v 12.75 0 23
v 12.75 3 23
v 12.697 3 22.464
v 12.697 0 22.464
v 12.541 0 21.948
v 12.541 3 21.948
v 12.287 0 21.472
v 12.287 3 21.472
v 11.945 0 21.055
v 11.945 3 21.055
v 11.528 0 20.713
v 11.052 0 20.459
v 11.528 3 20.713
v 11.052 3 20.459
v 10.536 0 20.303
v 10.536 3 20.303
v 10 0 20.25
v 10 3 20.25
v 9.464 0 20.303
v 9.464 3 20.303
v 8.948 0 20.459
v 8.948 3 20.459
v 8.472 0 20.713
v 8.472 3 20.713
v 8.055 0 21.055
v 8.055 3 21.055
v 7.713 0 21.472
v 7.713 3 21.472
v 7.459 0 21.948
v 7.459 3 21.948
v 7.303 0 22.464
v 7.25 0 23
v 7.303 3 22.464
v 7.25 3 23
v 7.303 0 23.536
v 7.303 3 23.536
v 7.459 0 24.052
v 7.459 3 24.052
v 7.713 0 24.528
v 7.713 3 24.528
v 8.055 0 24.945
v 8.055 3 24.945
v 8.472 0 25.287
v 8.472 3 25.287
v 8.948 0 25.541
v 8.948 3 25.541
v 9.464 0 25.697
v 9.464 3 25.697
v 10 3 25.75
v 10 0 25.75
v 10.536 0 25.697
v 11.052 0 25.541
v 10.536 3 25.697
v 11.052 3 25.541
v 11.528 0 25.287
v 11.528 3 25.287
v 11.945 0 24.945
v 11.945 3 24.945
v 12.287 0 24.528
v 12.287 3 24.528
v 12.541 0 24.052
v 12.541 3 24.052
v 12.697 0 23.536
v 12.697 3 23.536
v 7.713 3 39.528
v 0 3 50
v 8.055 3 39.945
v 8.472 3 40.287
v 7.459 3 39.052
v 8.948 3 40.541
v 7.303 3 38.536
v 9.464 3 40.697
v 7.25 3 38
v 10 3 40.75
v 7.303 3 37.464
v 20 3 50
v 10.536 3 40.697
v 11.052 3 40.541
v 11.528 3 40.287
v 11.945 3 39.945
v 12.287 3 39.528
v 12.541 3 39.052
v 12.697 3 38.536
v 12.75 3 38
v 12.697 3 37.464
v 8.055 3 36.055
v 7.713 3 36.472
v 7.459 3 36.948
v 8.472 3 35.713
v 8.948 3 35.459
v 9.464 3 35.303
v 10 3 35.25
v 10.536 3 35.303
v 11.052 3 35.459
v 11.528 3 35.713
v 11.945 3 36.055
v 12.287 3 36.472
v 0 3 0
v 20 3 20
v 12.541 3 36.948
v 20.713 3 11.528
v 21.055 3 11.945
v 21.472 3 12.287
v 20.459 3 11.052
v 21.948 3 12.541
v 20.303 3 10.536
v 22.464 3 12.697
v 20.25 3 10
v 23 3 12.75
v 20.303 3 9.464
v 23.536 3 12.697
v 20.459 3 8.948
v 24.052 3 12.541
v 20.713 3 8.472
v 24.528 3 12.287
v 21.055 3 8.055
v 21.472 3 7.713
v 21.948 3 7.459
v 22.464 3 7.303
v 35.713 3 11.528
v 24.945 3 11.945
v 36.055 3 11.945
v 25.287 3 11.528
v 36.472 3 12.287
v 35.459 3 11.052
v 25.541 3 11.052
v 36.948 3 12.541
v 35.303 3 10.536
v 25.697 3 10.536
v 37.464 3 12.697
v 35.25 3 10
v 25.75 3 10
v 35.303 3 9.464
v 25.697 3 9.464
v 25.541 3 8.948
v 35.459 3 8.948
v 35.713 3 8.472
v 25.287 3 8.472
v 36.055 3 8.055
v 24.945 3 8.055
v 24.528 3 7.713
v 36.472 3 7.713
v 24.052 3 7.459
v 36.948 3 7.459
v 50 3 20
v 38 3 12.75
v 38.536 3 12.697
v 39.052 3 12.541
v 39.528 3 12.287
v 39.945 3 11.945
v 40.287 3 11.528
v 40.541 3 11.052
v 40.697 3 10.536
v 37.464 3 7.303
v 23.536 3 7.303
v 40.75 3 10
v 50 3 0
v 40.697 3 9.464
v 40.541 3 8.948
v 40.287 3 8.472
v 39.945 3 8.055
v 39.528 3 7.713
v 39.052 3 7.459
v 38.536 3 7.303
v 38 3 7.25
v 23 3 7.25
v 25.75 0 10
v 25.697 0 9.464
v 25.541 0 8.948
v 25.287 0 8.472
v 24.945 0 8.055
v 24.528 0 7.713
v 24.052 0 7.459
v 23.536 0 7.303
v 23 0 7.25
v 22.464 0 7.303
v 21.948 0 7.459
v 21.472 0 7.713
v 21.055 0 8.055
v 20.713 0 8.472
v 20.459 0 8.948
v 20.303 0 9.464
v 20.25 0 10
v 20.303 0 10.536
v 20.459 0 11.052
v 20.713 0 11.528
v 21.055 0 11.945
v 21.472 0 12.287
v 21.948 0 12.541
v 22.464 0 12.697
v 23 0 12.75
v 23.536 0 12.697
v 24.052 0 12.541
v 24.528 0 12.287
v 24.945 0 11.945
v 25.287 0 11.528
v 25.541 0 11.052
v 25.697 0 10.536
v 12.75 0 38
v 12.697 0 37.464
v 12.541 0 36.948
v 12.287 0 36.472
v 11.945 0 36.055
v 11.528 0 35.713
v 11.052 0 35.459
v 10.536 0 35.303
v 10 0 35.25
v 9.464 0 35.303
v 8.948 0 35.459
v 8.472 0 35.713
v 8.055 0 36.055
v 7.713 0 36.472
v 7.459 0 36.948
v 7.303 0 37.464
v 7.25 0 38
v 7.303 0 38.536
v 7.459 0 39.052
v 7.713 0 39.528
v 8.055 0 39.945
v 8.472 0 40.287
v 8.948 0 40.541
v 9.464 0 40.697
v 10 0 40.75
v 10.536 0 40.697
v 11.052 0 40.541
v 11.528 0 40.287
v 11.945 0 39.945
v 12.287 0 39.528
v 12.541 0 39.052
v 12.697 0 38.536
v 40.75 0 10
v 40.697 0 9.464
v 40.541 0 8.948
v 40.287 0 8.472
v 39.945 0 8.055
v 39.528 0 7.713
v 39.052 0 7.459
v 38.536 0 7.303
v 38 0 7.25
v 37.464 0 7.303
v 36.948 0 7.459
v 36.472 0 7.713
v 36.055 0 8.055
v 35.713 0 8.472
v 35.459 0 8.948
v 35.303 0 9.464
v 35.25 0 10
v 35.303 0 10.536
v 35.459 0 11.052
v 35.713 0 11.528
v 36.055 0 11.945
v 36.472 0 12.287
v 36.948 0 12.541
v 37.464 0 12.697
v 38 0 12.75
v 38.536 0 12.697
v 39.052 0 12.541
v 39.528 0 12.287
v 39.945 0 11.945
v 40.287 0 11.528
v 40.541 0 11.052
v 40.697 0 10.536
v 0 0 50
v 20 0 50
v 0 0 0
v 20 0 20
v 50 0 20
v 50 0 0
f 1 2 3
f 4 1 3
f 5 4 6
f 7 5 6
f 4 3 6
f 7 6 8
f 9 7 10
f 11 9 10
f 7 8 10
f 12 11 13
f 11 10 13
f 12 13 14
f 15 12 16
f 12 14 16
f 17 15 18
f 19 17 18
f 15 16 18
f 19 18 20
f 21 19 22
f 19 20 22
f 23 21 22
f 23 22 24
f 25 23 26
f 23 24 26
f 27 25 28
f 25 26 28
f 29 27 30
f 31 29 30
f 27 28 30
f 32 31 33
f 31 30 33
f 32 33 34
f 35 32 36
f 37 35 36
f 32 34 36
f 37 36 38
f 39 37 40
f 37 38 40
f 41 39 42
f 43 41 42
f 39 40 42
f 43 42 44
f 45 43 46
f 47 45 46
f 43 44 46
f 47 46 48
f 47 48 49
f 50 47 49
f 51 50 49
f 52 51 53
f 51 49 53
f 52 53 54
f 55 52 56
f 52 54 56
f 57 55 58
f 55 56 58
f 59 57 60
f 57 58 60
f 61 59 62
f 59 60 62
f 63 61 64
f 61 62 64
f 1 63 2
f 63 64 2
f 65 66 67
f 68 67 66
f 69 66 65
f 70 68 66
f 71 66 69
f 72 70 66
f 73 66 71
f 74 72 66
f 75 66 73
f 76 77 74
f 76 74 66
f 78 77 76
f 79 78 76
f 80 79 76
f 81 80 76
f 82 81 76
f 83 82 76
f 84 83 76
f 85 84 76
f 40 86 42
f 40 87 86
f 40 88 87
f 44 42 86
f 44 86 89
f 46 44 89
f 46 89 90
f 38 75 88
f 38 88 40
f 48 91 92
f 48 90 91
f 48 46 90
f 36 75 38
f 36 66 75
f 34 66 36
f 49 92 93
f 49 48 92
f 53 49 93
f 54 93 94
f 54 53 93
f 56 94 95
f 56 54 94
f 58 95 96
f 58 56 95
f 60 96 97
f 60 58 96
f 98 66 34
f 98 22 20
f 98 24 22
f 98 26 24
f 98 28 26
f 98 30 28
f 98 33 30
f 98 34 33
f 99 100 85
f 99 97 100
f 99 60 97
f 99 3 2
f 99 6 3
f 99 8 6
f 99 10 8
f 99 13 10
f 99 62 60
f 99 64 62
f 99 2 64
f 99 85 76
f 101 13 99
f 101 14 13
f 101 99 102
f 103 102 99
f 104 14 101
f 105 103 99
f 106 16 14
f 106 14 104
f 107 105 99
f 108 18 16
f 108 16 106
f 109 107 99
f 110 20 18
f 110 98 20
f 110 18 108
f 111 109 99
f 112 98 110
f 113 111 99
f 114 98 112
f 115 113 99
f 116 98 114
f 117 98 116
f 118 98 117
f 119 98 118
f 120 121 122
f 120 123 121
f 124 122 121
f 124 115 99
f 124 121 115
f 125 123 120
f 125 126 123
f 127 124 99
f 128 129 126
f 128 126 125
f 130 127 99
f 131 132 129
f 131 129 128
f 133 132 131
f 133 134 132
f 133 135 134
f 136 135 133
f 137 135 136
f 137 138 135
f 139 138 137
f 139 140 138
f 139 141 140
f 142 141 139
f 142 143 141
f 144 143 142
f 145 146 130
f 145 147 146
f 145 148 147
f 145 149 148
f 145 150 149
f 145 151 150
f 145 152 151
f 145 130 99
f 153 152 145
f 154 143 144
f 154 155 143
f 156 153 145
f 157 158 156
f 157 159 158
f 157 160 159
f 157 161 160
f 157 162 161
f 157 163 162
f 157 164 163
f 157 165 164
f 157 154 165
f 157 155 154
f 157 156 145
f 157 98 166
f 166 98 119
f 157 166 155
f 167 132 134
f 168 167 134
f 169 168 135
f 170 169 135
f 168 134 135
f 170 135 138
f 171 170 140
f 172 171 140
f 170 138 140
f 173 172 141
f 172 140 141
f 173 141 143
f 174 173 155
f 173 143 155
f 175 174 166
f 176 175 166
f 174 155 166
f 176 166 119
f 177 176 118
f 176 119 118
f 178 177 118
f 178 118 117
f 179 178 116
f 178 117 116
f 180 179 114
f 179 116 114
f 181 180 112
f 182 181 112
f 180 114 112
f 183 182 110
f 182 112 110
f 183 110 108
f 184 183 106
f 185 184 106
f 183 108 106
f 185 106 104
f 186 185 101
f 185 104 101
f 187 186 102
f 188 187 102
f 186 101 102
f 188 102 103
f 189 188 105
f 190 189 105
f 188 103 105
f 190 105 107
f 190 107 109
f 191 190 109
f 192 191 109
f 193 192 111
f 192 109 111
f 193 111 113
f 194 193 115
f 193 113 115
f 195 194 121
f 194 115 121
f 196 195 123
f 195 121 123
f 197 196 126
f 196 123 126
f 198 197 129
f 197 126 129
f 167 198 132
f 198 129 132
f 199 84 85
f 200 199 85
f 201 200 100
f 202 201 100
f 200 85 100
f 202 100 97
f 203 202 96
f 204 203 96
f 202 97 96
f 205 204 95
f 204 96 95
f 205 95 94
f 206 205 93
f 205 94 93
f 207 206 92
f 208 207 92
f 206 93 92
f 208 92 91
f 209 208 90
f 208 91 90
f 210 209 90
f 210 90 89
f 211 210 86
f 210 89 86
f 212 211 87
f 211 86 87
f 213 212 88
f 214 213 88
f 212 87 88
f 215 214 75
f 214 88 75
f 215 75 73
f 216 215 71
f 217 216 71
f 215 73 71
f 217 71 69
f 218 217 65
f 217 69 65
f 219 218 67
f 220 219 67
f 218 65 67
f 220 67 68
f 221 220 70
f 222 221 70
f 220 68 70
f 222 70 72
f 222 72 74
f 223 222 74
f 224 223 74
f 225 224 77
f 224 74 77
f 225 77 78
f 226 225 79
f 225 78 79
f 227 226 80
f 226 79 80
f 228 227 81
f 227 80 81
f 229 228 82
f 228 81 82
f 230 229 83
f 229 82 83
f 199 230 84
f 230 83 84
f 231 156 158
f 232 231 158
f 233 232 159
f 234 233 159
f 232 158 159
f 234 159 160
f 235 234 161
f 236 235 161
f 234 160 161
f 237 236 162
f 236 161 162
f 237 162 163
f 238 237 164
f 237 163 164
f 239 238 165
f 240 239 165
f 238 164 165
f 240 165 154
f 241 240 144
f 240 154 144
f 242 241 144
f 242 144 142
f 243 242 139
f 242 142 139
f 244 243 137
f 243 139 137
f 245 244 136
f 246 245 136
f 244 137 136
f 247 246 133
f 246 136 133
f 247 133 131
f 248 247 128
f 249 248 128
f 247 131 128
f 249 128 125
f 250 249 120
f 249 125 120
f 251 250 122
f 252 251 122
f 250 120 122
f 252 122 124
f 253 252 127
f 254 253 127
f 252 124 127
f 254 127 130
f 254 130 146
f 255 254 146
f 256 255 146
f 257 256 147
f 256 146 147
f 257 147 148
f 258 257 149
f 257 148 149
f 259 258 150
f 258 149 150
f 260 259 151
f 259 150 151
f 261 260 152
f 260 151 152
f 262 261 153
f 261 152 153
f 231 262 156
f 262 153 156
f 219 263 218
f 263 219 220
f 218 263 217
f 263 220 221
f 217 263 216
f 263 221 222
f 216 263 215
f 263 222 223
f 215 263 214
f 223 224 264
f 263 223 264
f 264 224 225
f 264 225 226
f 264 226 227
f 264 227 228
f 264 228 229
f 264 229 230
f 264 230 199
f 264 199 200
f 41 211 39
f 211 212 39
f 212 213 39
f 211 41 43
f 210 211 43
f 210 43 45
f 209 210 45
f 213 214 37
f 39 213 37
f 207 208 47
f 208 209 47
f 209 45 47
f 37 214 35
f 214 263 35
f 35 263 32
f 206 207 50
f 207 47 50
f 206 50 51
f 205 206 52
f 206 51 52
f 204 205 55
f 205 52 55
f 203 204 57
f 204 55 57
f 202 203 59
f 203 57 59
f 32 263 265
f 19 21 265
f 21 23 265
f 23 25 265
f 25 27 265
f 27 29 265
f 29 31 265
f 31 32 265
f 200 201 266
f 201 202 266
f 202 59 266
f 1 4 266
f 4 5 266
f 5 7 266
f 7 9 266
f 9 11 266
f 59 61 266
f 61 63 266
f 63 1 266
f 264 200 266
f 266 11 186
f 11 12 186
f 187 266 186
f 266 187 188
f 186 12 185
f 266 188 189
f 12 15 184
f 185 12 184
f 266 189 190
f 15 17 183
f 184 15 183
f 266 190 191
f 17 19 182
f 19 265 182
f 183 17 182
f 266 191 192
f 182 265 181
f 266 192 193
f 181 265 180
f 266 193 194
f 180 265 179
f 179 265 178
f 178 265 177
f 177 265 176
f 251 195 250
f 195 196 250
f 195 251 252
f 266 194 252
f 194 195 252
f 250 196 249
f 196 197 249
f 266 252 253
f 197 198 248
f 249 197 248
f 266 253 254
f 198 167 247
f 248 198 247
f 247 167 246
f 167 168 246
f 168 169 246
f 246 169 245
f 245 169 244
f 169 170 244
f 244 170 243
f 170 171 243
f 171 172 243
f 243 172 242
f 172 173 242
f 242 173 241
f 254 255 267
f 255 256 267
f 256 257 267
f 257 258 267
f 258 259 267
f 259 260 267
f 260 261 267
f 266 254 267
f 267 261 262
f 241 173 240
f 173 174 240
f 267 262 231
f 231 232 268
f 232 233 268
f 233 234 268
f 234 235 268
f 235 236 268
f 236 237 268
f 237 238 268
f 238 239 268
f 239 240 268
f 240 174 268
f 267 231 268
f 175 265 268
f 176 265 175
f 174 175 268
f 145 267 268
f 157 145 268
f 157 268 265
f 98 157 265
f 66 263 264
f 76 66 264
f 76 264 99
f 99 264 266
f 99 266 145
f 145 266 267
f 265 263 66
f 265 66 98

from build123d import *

# Parameters (mm, degrees)
SKETCH1_W           = 20
SKETCH1_H           = 50
SKETCH1_W_2         = 30
SKETCH1_H_2         = 20
BOSS_EXTRUDE1_DEPTH = 3
SKETCH3_R           = 2.75
CUT_EXTRUDE1_DEPTH  = 3


with BuildPart() as part:
    # Sketch1 → Boss-Extrude1 (new body)
    with BuildSketch(Plane(origin=(0, 0, 0), x_dir=(1, 0, 0), z_dir=(0, 1, 0))):
        with Locations((10, -25)):
            Rectangle(SKETCH1_W, SKETCH1_H)
        with Locations((35, -10)):
            Rectangle(SKETCH1_W_2, SKETCH1_H_2)
    extrude(amount=BOSS_EXTRUDE1_DEPTH)

    # Sketch3 → Cut-Extrude1 (cut)
    with BuildSketch(Plane(origin=(0, 3, 0), x_dir=(1, 0, 0), z_dir=(0, 1, 0))):
        with Locations((10, -38)):
            Circle(SKETCH3_R)
        with Locations((10, -23)):
            Circle(SKETCH3_R)
        with Locations((38, -10)):
            Circle(SKETCH3_R)
        with Locations((23, -10)):
            Circle(SKETCH3_R)
    extrude(amount=-CUT_EXTRUDE1_DEPTH, mode=Mode.SUBTRACT)


solid = part.part
